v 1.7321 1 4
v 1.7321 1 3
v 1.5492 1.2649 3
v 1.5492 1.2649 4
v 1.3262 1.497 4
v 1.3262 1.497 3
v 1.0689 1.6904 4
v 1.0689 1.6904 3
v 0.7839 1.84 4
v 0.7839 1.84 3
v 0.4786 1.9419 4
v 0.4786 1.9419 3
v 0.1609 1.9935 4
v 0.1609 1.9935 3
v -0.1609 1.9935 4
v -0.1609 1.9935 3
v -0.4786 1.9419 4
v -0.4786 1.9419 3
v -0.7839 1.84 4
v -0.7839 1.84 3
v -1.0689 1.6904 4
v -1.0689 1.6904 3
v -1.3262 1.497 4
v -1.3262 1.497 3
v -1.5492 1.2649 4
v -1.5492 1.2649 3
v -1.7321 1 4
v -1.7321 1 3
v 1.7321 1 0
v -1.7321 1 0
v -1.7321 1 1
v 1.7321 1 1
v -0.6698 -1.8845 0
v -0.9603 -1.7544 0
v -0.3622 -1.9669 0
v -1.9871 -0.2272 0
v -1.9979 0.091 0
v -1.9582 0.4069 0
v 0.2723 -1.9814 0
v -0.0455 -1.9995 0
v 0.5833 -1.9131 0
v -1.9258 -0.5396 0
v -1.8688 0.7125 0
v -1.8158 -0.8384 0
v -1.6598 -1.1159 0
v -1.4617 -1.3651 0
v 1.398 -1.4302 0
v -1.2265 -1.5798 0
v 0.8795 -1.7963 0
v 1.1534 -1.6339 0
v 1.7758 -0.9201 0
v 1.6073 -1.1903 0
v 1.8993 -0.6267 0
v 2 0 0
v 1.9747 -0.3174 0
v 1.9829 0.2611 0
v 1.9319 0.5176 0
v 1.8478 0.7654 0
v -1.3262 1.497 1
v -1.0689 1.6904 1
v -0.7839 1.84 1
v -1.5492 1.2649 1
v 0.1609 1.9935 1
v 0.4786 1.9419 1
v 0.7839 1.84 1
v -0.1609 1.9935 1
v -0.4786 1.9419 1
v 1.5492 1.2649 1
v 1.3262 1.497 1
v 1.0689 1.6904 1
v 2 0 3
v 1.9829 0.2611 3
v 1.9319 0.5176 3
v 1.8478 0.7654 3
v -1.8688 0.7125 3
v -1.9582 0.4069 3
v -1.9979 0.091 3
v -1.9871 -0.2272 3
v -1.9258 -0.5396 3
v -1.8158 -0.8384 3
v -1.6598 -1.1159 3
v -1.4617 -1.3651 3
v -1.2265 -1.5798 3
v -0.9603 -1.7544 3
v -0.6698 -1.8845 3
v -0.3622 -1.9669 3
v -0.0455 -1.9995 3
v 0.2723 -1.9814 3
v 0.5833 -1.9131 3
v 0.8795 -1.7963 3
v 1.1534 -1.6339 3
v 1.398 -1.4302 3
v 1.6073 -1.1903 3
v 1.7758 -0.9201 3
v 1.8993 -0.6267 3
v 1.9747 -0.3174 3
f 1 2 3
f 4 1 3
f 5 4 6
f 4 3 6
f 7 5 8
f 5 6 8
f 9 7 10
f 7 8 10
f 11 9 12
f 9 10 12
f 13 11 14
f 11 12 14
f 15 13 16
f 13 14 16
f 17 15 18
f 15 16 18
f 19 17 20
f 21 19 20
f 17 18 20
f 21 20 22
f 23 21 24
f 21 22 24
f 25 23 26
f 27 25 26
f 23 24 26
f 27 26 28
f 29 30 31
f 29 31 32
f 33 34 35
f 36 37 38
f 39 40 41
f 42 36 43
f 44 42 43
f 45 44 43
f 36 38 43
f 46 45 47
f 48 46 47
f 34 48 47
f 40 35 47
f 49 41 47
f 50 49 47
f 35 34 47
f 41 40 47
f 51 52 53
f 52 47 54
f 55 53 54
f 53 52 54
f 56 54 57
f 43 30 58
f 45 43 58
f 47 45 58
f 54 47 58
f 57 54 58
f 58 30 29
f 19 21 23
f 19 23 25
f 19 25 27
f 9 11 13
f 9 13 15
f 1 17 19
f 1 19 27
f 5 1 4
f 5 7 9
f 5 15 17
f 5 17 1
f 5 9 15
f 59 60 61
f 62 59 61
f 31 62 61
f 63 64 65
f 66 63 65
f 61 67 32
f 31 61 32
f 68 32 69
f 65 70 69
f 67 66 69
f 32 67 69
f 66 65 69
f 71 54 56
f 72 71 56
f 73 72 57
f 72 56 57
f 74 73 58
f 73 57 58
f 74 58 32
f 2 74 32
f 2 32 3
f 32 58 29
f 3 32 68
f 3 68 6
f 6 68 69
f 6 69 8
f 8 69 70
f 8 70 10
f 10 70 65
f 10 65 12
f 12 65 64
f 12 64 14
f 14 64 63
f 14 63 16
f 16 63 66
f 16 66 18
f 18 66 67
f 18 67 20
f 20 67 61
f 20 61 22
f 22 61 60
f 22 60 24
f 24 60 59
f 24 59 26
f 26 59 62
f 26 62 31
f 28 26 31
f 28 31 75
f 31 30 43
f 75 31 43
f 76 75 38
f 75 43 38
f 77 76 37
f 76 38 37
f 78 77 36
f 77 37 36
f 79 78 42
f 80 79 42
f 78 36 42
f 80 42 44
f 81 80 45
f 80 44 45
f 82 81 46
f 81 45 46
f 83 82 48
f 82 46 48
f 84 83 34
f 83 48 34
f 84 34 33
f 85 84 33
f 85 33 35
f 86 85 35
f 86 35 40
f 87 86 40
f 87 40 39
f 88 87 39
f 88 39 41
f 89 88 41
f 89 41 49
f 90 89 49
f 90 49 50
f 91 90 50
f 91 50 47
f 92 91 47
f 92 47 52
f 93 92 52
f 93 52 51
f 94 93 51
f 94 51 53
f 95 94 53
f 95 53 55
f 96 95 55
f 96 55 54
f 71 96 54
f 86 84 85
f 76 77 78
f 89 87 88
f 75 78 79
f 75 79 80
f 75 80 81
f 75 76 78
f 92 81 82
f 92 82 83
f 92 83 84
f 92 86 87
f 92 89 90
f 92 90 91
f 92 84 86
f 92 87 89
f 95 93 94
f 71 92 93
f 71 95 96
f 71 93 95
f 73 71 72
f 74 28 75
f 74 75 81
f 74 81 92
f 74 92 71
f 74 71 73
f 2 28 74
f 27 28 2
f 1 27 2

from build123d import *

# Parameters (mm, degrees)
SKETCH1_R           = 2
BOSS_EXTRUDE1_DEPTH = 3
BOSS_EXTRUDE2_DEPTH = 1
CUT_EXTRUDE1_DEPTH  = 1


with BuildPart() as part:
    # Sketch1 → Boss-Extrude1 (new body)
    with BuildSketch(Plane.XY):
        Circle(SKETCH1_R)
    extrude(amount=BOSS_EXTRUDE1_DEPTH)

    # Sketch2 → Boss-Extrude2 (add)
    with BuildSketch(Plane.XY.offset(3)):
        with BuildLine():
            Line((-1.732050808, 1), (1.732050808, 1))
            ThreePointArc((1.732050808, 1), (0, 2), (-1.732050808, 1))
        make_face()
    extrude(amount=BOSS_EXTRUDE2_DEPTH)

    # Sketch3 → Cut-Extrude1 (cut)
    with BuildSketch(Plane(origin=(0, 0, 0), x_dir=(-1, 0, 0), z_dir=(0, 0, -1))):
        with BuildLine():
            Line((1.732050808, 1), (-1.732050808, 1))
            ThreePointArc((-1.732050808, 1), (0, 2), (1.732050808, 1))
        make_face()
    extrude(amount=-CUT_EXTRUDE1_DEPTH, mode=Mode.SUBTRACT)


solid = part.part
